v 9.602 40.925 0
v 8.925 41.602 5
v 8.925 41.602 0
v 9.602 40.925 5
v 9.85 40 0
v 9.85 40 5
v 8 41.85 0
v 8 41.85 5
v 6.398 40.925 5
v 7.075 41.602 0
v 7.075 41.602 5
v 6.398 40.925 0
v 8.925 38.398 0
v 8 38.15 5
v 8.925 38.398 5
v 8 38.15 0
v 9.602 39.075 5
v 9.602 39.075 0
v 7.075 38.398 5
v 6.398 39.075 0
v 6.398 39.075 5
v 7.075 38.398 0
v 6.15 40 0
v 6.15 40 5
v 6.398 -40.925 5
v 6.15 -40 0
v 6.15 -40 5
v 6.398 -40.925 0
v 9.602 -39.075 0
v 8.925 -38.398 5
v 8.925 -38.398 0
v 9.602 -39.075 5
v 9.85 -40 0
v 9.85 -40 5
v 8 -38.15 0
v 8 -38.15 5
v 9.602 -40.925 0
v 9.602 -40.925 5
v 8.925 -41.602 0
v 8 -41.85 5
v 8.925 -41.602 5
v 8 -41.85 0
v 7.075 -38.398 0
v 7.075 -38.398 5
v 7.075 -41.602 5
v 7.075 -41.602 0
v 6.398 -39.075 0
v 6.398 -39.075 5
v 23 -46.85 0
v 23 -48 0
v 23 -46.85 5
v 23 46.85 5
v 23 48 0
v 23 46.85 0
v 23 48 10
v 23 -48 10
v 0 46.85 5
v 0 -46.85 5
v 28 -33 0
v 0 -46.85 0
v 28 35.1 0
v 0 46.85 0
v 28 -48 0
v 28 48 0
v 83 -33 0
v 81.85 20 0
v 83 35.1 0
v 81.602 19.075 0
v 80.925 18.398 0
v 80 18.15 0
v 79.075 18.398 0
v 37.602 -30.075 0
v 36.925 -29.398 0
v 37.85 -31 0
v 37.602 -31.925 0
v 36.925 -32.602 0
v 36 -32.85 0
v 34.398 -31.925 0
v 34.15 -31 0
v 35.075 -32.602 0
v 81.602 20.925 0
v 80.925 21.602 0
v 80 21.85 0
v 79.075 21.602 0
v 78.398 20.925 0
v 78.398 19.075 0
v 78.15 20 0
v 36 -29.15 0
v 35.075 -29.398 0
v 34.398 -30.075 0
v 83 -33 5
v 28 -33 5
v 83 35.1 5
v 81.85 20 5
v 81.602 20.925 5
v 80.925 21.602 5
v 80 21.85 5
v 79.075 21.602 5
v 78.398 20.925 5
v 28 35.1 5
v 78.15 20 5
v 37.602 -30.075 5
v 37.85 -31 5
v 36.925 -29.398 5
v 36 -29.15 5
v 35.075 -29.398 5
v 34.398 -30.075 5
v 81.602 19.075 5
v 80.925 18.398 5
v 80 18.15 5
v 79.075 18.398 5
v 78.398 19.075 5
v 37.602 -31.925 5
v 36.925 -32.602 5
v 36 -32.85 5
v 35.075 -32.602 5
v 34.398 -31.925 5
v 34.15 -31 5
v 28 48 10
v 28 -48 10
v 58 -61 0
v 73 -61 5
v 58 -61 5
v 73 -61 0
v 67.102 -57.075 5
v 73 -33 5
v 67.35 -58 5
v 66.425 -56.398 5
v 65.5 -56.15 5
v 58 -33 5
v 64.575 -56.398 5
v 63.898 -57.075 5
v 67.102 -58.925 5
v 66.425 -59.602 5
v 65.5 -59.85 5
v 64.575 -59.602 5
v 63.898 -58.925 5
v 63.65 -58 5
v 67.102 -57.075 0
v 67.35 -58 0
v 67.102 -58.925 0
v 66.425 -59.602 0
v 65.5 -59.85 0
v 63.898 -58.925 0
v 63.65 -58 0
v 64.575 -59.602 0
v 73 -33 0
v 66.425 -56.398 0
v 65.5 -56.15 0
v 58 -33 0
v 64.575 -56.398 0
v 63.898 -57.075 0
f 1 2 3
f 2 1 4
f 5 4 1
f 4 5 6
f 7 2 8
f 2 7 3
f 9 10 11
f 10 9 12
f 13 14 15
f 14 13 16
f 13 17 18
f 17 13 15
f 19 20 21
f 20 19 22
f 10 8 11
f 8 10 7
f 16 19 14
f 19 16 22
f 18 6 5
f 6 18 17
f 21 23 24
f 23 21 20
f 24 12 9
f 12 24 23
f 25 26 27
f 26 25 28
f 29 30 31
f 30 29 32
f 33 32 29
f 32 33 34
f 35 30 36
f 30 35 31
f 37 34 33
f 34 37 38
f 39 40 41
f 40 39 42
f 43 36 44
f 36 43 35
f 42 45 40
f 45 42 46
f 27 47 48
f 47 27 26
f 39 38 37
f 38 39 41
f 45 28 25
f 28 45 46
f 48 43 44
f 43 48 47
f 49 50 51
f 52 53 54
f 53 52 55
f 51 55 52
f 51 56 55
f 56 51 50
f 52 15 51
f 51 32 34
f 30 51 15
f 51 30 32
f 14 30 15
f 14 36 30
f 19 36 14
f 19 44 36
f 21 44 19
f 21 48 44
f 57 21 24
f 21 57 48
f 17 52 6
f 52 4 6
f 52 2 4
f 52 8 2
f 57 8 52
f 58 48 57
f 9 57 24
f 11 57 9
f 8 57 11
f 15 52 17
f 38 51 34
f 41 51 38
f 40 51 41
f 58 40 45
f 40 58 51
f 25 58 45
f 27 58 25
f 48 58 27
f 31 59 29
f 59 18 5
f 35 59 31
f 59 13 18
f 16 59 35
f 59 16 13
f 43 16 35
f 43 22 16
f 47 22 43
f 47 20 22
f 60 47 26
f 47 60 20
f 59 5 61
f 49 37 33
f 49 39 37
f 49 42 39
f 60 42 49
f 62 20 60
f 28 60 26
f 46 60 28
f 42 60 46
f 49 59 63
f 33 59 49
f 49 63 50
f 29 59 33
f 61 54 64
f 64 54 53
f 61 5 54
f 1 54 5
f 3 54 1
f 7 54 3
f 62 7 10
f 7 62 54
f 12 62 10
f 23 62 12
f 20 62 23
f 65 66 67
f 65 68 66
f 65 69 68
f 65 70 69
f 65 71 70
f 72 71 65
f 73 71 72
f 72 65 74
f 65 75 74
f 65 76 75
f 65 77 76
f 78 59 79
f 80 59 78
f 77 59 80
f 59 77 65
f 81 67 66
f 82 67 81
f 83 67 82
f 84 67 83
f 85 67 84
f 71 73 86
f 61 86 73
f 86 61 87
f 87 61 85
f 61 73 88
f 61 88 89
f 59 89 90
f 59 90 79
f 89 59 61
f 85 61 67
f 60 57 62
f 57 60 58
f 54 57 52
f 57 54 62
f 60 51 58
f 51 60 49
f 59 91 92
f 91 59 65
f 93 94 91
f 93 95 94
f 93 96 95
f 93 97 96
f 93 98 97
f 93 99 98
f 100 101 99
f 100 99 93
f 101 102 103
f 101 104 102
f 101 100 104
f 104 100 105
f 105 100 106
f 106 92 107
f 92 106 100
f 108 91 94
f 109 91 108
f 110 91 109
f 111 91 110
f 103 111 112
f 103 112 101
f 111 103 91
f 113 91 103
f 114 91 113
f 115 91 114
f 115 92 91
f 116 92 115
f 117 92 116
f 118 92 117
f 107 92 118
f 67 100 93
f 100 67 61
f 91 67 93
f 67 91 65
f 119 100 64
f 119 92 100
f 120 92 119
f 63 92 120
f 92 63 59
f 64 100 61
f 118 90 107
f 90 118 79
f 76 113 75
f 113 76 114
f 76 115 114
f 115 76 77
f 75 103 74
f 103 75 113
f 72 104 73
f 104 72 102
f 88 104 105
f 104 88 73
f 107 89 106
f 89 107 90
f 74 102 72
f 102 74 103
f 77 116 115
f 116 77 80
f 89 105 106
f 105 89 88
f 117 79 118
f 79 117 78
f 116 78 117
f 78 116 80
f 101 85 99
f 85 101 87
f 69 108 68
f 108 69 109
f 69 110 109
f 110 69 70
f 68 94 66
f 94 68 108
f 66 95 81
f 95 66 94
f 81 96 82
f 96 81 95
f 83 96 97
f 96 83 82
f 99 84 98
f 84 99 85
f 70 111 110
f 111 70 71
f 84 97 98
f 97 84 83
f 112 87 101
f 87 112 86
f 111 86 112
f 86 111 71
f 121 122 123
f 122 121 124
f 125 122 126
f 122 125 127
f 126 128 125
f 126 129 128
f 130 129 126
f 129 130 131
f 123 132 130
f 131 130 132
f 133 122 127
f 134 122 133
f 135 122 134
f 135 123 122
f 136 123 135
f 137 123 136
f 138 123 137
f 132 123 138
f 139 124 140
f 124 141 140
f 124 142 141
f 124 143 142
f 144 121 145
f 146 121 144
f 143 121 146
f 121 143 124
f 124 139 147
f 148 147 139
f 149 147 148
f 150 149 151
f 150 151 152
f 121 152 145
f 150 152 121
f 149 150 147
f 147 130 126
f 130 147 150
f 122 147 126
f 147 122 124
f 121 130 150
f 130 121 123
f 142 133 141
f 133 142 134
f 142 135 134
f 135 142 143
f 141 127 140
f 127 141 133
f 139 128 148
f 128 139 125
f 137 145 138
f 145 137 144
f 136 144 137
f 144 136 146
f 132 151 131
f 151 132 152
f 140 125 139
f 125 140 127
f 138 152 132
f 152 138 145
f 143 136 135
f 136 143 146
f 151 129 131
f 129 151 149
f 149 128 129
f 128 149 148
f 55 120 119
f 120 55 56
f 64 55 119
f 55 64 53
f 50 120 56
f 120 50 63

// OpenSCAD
/*
DT-DMD-DHT-mount
	A 3D printed mounting, to attach a Seeduino which has a DHT22 digital Humidity and Temperature sensor soldered onto it to a Freetronics Dot Matrix Display.
	DavidTangye@gmail.com - 03 Sep 2014
*/

holeD = 3.7;

dmdX = 23;
dmdHoleInX = 15;		// Back in from right edge (dmdX)
dmdHoleGapY = 80;
dmdY=dmdHoleGapY+holeD+10;

lipX = 5;
lipZ = 5;

cdX = 68;
cdY = 55;
cdUpprHoleX = 15;  // From the left edge
cdUpprHoleY = 52;	 // Up from the lower edge 
cdLwrHoleX = 66;  // From the left edge
cdLwrHoleY = 8;    // Up from the lower edge
dhtUpperHoleY = 15; // up from Seeduino Y centre

dhtHigh = 25;
dhtWide = 15;
dhtGap = 3;
dhtUp = 30;   // Up from lower edge seeduino to DHT

highY = max(dmdY,cdX+dhtHigh+dhtGap); // zz
dhtMountLiftY = highY/2 + 35; // Lift to align the cable.

theZ = 5;


Xx = 0.1;
$fn=12;

module DMDmount() {
	difference() {
		cube([dmdX,dmdY,theZ]);
		translate([dmdX-dmdHoleInX,dmdY/2,-Xx]) {
			translate([0,dmdHoleGapY/2,0])
				cylinder(r=holeD/2,h=2*Xx+theZ);
			translate([0,-dmdHoleGapY/2,0])
				cylinder(r=holeD/2,h=2*Xx+theZ);
		}
	}
}

module SeeduinoMount() {
	difference() {
		cube([cdX+Xx,cdY,theZ]);
		translate([cdLwrHoleX+Xx,cdLwrHoleY,-Xx])
			cylinder(r=holeD/2,h=2*Xx+theZ);
		translate([cdUpprHoleX+Xx,cdUpprHoleY,-Xx])
			cylinder(r=holeD/2,h=2*Xx+theZ);
	}
}

module DHTmount() {
	translate([-Xx,0,0]) // Workaround for bug in openscad
		SeeduinoMount();
	translate([cdX,dhtUp,0])
		difference() {
			cube([dhtHigh+dhtGap,dhtWide,theZ]);
			translate([dhtHigh+dhtGap-3,dhtWide/2,0])
				cylinder(r=holeD/2,h=2*Xx+theZ);
		}
}

	translate([0,-dmdY/2,0])
		DMDmount();
	translate([0,-highY/2,0]) {
		translate([dmdX,0,0])
			cube([lipX,highY,theZ+lipZ]);
		translate([dmdX+lipX,dhtMountLiftY,0])
			rotate([0,0,-90])
			DHTmount();
	}
